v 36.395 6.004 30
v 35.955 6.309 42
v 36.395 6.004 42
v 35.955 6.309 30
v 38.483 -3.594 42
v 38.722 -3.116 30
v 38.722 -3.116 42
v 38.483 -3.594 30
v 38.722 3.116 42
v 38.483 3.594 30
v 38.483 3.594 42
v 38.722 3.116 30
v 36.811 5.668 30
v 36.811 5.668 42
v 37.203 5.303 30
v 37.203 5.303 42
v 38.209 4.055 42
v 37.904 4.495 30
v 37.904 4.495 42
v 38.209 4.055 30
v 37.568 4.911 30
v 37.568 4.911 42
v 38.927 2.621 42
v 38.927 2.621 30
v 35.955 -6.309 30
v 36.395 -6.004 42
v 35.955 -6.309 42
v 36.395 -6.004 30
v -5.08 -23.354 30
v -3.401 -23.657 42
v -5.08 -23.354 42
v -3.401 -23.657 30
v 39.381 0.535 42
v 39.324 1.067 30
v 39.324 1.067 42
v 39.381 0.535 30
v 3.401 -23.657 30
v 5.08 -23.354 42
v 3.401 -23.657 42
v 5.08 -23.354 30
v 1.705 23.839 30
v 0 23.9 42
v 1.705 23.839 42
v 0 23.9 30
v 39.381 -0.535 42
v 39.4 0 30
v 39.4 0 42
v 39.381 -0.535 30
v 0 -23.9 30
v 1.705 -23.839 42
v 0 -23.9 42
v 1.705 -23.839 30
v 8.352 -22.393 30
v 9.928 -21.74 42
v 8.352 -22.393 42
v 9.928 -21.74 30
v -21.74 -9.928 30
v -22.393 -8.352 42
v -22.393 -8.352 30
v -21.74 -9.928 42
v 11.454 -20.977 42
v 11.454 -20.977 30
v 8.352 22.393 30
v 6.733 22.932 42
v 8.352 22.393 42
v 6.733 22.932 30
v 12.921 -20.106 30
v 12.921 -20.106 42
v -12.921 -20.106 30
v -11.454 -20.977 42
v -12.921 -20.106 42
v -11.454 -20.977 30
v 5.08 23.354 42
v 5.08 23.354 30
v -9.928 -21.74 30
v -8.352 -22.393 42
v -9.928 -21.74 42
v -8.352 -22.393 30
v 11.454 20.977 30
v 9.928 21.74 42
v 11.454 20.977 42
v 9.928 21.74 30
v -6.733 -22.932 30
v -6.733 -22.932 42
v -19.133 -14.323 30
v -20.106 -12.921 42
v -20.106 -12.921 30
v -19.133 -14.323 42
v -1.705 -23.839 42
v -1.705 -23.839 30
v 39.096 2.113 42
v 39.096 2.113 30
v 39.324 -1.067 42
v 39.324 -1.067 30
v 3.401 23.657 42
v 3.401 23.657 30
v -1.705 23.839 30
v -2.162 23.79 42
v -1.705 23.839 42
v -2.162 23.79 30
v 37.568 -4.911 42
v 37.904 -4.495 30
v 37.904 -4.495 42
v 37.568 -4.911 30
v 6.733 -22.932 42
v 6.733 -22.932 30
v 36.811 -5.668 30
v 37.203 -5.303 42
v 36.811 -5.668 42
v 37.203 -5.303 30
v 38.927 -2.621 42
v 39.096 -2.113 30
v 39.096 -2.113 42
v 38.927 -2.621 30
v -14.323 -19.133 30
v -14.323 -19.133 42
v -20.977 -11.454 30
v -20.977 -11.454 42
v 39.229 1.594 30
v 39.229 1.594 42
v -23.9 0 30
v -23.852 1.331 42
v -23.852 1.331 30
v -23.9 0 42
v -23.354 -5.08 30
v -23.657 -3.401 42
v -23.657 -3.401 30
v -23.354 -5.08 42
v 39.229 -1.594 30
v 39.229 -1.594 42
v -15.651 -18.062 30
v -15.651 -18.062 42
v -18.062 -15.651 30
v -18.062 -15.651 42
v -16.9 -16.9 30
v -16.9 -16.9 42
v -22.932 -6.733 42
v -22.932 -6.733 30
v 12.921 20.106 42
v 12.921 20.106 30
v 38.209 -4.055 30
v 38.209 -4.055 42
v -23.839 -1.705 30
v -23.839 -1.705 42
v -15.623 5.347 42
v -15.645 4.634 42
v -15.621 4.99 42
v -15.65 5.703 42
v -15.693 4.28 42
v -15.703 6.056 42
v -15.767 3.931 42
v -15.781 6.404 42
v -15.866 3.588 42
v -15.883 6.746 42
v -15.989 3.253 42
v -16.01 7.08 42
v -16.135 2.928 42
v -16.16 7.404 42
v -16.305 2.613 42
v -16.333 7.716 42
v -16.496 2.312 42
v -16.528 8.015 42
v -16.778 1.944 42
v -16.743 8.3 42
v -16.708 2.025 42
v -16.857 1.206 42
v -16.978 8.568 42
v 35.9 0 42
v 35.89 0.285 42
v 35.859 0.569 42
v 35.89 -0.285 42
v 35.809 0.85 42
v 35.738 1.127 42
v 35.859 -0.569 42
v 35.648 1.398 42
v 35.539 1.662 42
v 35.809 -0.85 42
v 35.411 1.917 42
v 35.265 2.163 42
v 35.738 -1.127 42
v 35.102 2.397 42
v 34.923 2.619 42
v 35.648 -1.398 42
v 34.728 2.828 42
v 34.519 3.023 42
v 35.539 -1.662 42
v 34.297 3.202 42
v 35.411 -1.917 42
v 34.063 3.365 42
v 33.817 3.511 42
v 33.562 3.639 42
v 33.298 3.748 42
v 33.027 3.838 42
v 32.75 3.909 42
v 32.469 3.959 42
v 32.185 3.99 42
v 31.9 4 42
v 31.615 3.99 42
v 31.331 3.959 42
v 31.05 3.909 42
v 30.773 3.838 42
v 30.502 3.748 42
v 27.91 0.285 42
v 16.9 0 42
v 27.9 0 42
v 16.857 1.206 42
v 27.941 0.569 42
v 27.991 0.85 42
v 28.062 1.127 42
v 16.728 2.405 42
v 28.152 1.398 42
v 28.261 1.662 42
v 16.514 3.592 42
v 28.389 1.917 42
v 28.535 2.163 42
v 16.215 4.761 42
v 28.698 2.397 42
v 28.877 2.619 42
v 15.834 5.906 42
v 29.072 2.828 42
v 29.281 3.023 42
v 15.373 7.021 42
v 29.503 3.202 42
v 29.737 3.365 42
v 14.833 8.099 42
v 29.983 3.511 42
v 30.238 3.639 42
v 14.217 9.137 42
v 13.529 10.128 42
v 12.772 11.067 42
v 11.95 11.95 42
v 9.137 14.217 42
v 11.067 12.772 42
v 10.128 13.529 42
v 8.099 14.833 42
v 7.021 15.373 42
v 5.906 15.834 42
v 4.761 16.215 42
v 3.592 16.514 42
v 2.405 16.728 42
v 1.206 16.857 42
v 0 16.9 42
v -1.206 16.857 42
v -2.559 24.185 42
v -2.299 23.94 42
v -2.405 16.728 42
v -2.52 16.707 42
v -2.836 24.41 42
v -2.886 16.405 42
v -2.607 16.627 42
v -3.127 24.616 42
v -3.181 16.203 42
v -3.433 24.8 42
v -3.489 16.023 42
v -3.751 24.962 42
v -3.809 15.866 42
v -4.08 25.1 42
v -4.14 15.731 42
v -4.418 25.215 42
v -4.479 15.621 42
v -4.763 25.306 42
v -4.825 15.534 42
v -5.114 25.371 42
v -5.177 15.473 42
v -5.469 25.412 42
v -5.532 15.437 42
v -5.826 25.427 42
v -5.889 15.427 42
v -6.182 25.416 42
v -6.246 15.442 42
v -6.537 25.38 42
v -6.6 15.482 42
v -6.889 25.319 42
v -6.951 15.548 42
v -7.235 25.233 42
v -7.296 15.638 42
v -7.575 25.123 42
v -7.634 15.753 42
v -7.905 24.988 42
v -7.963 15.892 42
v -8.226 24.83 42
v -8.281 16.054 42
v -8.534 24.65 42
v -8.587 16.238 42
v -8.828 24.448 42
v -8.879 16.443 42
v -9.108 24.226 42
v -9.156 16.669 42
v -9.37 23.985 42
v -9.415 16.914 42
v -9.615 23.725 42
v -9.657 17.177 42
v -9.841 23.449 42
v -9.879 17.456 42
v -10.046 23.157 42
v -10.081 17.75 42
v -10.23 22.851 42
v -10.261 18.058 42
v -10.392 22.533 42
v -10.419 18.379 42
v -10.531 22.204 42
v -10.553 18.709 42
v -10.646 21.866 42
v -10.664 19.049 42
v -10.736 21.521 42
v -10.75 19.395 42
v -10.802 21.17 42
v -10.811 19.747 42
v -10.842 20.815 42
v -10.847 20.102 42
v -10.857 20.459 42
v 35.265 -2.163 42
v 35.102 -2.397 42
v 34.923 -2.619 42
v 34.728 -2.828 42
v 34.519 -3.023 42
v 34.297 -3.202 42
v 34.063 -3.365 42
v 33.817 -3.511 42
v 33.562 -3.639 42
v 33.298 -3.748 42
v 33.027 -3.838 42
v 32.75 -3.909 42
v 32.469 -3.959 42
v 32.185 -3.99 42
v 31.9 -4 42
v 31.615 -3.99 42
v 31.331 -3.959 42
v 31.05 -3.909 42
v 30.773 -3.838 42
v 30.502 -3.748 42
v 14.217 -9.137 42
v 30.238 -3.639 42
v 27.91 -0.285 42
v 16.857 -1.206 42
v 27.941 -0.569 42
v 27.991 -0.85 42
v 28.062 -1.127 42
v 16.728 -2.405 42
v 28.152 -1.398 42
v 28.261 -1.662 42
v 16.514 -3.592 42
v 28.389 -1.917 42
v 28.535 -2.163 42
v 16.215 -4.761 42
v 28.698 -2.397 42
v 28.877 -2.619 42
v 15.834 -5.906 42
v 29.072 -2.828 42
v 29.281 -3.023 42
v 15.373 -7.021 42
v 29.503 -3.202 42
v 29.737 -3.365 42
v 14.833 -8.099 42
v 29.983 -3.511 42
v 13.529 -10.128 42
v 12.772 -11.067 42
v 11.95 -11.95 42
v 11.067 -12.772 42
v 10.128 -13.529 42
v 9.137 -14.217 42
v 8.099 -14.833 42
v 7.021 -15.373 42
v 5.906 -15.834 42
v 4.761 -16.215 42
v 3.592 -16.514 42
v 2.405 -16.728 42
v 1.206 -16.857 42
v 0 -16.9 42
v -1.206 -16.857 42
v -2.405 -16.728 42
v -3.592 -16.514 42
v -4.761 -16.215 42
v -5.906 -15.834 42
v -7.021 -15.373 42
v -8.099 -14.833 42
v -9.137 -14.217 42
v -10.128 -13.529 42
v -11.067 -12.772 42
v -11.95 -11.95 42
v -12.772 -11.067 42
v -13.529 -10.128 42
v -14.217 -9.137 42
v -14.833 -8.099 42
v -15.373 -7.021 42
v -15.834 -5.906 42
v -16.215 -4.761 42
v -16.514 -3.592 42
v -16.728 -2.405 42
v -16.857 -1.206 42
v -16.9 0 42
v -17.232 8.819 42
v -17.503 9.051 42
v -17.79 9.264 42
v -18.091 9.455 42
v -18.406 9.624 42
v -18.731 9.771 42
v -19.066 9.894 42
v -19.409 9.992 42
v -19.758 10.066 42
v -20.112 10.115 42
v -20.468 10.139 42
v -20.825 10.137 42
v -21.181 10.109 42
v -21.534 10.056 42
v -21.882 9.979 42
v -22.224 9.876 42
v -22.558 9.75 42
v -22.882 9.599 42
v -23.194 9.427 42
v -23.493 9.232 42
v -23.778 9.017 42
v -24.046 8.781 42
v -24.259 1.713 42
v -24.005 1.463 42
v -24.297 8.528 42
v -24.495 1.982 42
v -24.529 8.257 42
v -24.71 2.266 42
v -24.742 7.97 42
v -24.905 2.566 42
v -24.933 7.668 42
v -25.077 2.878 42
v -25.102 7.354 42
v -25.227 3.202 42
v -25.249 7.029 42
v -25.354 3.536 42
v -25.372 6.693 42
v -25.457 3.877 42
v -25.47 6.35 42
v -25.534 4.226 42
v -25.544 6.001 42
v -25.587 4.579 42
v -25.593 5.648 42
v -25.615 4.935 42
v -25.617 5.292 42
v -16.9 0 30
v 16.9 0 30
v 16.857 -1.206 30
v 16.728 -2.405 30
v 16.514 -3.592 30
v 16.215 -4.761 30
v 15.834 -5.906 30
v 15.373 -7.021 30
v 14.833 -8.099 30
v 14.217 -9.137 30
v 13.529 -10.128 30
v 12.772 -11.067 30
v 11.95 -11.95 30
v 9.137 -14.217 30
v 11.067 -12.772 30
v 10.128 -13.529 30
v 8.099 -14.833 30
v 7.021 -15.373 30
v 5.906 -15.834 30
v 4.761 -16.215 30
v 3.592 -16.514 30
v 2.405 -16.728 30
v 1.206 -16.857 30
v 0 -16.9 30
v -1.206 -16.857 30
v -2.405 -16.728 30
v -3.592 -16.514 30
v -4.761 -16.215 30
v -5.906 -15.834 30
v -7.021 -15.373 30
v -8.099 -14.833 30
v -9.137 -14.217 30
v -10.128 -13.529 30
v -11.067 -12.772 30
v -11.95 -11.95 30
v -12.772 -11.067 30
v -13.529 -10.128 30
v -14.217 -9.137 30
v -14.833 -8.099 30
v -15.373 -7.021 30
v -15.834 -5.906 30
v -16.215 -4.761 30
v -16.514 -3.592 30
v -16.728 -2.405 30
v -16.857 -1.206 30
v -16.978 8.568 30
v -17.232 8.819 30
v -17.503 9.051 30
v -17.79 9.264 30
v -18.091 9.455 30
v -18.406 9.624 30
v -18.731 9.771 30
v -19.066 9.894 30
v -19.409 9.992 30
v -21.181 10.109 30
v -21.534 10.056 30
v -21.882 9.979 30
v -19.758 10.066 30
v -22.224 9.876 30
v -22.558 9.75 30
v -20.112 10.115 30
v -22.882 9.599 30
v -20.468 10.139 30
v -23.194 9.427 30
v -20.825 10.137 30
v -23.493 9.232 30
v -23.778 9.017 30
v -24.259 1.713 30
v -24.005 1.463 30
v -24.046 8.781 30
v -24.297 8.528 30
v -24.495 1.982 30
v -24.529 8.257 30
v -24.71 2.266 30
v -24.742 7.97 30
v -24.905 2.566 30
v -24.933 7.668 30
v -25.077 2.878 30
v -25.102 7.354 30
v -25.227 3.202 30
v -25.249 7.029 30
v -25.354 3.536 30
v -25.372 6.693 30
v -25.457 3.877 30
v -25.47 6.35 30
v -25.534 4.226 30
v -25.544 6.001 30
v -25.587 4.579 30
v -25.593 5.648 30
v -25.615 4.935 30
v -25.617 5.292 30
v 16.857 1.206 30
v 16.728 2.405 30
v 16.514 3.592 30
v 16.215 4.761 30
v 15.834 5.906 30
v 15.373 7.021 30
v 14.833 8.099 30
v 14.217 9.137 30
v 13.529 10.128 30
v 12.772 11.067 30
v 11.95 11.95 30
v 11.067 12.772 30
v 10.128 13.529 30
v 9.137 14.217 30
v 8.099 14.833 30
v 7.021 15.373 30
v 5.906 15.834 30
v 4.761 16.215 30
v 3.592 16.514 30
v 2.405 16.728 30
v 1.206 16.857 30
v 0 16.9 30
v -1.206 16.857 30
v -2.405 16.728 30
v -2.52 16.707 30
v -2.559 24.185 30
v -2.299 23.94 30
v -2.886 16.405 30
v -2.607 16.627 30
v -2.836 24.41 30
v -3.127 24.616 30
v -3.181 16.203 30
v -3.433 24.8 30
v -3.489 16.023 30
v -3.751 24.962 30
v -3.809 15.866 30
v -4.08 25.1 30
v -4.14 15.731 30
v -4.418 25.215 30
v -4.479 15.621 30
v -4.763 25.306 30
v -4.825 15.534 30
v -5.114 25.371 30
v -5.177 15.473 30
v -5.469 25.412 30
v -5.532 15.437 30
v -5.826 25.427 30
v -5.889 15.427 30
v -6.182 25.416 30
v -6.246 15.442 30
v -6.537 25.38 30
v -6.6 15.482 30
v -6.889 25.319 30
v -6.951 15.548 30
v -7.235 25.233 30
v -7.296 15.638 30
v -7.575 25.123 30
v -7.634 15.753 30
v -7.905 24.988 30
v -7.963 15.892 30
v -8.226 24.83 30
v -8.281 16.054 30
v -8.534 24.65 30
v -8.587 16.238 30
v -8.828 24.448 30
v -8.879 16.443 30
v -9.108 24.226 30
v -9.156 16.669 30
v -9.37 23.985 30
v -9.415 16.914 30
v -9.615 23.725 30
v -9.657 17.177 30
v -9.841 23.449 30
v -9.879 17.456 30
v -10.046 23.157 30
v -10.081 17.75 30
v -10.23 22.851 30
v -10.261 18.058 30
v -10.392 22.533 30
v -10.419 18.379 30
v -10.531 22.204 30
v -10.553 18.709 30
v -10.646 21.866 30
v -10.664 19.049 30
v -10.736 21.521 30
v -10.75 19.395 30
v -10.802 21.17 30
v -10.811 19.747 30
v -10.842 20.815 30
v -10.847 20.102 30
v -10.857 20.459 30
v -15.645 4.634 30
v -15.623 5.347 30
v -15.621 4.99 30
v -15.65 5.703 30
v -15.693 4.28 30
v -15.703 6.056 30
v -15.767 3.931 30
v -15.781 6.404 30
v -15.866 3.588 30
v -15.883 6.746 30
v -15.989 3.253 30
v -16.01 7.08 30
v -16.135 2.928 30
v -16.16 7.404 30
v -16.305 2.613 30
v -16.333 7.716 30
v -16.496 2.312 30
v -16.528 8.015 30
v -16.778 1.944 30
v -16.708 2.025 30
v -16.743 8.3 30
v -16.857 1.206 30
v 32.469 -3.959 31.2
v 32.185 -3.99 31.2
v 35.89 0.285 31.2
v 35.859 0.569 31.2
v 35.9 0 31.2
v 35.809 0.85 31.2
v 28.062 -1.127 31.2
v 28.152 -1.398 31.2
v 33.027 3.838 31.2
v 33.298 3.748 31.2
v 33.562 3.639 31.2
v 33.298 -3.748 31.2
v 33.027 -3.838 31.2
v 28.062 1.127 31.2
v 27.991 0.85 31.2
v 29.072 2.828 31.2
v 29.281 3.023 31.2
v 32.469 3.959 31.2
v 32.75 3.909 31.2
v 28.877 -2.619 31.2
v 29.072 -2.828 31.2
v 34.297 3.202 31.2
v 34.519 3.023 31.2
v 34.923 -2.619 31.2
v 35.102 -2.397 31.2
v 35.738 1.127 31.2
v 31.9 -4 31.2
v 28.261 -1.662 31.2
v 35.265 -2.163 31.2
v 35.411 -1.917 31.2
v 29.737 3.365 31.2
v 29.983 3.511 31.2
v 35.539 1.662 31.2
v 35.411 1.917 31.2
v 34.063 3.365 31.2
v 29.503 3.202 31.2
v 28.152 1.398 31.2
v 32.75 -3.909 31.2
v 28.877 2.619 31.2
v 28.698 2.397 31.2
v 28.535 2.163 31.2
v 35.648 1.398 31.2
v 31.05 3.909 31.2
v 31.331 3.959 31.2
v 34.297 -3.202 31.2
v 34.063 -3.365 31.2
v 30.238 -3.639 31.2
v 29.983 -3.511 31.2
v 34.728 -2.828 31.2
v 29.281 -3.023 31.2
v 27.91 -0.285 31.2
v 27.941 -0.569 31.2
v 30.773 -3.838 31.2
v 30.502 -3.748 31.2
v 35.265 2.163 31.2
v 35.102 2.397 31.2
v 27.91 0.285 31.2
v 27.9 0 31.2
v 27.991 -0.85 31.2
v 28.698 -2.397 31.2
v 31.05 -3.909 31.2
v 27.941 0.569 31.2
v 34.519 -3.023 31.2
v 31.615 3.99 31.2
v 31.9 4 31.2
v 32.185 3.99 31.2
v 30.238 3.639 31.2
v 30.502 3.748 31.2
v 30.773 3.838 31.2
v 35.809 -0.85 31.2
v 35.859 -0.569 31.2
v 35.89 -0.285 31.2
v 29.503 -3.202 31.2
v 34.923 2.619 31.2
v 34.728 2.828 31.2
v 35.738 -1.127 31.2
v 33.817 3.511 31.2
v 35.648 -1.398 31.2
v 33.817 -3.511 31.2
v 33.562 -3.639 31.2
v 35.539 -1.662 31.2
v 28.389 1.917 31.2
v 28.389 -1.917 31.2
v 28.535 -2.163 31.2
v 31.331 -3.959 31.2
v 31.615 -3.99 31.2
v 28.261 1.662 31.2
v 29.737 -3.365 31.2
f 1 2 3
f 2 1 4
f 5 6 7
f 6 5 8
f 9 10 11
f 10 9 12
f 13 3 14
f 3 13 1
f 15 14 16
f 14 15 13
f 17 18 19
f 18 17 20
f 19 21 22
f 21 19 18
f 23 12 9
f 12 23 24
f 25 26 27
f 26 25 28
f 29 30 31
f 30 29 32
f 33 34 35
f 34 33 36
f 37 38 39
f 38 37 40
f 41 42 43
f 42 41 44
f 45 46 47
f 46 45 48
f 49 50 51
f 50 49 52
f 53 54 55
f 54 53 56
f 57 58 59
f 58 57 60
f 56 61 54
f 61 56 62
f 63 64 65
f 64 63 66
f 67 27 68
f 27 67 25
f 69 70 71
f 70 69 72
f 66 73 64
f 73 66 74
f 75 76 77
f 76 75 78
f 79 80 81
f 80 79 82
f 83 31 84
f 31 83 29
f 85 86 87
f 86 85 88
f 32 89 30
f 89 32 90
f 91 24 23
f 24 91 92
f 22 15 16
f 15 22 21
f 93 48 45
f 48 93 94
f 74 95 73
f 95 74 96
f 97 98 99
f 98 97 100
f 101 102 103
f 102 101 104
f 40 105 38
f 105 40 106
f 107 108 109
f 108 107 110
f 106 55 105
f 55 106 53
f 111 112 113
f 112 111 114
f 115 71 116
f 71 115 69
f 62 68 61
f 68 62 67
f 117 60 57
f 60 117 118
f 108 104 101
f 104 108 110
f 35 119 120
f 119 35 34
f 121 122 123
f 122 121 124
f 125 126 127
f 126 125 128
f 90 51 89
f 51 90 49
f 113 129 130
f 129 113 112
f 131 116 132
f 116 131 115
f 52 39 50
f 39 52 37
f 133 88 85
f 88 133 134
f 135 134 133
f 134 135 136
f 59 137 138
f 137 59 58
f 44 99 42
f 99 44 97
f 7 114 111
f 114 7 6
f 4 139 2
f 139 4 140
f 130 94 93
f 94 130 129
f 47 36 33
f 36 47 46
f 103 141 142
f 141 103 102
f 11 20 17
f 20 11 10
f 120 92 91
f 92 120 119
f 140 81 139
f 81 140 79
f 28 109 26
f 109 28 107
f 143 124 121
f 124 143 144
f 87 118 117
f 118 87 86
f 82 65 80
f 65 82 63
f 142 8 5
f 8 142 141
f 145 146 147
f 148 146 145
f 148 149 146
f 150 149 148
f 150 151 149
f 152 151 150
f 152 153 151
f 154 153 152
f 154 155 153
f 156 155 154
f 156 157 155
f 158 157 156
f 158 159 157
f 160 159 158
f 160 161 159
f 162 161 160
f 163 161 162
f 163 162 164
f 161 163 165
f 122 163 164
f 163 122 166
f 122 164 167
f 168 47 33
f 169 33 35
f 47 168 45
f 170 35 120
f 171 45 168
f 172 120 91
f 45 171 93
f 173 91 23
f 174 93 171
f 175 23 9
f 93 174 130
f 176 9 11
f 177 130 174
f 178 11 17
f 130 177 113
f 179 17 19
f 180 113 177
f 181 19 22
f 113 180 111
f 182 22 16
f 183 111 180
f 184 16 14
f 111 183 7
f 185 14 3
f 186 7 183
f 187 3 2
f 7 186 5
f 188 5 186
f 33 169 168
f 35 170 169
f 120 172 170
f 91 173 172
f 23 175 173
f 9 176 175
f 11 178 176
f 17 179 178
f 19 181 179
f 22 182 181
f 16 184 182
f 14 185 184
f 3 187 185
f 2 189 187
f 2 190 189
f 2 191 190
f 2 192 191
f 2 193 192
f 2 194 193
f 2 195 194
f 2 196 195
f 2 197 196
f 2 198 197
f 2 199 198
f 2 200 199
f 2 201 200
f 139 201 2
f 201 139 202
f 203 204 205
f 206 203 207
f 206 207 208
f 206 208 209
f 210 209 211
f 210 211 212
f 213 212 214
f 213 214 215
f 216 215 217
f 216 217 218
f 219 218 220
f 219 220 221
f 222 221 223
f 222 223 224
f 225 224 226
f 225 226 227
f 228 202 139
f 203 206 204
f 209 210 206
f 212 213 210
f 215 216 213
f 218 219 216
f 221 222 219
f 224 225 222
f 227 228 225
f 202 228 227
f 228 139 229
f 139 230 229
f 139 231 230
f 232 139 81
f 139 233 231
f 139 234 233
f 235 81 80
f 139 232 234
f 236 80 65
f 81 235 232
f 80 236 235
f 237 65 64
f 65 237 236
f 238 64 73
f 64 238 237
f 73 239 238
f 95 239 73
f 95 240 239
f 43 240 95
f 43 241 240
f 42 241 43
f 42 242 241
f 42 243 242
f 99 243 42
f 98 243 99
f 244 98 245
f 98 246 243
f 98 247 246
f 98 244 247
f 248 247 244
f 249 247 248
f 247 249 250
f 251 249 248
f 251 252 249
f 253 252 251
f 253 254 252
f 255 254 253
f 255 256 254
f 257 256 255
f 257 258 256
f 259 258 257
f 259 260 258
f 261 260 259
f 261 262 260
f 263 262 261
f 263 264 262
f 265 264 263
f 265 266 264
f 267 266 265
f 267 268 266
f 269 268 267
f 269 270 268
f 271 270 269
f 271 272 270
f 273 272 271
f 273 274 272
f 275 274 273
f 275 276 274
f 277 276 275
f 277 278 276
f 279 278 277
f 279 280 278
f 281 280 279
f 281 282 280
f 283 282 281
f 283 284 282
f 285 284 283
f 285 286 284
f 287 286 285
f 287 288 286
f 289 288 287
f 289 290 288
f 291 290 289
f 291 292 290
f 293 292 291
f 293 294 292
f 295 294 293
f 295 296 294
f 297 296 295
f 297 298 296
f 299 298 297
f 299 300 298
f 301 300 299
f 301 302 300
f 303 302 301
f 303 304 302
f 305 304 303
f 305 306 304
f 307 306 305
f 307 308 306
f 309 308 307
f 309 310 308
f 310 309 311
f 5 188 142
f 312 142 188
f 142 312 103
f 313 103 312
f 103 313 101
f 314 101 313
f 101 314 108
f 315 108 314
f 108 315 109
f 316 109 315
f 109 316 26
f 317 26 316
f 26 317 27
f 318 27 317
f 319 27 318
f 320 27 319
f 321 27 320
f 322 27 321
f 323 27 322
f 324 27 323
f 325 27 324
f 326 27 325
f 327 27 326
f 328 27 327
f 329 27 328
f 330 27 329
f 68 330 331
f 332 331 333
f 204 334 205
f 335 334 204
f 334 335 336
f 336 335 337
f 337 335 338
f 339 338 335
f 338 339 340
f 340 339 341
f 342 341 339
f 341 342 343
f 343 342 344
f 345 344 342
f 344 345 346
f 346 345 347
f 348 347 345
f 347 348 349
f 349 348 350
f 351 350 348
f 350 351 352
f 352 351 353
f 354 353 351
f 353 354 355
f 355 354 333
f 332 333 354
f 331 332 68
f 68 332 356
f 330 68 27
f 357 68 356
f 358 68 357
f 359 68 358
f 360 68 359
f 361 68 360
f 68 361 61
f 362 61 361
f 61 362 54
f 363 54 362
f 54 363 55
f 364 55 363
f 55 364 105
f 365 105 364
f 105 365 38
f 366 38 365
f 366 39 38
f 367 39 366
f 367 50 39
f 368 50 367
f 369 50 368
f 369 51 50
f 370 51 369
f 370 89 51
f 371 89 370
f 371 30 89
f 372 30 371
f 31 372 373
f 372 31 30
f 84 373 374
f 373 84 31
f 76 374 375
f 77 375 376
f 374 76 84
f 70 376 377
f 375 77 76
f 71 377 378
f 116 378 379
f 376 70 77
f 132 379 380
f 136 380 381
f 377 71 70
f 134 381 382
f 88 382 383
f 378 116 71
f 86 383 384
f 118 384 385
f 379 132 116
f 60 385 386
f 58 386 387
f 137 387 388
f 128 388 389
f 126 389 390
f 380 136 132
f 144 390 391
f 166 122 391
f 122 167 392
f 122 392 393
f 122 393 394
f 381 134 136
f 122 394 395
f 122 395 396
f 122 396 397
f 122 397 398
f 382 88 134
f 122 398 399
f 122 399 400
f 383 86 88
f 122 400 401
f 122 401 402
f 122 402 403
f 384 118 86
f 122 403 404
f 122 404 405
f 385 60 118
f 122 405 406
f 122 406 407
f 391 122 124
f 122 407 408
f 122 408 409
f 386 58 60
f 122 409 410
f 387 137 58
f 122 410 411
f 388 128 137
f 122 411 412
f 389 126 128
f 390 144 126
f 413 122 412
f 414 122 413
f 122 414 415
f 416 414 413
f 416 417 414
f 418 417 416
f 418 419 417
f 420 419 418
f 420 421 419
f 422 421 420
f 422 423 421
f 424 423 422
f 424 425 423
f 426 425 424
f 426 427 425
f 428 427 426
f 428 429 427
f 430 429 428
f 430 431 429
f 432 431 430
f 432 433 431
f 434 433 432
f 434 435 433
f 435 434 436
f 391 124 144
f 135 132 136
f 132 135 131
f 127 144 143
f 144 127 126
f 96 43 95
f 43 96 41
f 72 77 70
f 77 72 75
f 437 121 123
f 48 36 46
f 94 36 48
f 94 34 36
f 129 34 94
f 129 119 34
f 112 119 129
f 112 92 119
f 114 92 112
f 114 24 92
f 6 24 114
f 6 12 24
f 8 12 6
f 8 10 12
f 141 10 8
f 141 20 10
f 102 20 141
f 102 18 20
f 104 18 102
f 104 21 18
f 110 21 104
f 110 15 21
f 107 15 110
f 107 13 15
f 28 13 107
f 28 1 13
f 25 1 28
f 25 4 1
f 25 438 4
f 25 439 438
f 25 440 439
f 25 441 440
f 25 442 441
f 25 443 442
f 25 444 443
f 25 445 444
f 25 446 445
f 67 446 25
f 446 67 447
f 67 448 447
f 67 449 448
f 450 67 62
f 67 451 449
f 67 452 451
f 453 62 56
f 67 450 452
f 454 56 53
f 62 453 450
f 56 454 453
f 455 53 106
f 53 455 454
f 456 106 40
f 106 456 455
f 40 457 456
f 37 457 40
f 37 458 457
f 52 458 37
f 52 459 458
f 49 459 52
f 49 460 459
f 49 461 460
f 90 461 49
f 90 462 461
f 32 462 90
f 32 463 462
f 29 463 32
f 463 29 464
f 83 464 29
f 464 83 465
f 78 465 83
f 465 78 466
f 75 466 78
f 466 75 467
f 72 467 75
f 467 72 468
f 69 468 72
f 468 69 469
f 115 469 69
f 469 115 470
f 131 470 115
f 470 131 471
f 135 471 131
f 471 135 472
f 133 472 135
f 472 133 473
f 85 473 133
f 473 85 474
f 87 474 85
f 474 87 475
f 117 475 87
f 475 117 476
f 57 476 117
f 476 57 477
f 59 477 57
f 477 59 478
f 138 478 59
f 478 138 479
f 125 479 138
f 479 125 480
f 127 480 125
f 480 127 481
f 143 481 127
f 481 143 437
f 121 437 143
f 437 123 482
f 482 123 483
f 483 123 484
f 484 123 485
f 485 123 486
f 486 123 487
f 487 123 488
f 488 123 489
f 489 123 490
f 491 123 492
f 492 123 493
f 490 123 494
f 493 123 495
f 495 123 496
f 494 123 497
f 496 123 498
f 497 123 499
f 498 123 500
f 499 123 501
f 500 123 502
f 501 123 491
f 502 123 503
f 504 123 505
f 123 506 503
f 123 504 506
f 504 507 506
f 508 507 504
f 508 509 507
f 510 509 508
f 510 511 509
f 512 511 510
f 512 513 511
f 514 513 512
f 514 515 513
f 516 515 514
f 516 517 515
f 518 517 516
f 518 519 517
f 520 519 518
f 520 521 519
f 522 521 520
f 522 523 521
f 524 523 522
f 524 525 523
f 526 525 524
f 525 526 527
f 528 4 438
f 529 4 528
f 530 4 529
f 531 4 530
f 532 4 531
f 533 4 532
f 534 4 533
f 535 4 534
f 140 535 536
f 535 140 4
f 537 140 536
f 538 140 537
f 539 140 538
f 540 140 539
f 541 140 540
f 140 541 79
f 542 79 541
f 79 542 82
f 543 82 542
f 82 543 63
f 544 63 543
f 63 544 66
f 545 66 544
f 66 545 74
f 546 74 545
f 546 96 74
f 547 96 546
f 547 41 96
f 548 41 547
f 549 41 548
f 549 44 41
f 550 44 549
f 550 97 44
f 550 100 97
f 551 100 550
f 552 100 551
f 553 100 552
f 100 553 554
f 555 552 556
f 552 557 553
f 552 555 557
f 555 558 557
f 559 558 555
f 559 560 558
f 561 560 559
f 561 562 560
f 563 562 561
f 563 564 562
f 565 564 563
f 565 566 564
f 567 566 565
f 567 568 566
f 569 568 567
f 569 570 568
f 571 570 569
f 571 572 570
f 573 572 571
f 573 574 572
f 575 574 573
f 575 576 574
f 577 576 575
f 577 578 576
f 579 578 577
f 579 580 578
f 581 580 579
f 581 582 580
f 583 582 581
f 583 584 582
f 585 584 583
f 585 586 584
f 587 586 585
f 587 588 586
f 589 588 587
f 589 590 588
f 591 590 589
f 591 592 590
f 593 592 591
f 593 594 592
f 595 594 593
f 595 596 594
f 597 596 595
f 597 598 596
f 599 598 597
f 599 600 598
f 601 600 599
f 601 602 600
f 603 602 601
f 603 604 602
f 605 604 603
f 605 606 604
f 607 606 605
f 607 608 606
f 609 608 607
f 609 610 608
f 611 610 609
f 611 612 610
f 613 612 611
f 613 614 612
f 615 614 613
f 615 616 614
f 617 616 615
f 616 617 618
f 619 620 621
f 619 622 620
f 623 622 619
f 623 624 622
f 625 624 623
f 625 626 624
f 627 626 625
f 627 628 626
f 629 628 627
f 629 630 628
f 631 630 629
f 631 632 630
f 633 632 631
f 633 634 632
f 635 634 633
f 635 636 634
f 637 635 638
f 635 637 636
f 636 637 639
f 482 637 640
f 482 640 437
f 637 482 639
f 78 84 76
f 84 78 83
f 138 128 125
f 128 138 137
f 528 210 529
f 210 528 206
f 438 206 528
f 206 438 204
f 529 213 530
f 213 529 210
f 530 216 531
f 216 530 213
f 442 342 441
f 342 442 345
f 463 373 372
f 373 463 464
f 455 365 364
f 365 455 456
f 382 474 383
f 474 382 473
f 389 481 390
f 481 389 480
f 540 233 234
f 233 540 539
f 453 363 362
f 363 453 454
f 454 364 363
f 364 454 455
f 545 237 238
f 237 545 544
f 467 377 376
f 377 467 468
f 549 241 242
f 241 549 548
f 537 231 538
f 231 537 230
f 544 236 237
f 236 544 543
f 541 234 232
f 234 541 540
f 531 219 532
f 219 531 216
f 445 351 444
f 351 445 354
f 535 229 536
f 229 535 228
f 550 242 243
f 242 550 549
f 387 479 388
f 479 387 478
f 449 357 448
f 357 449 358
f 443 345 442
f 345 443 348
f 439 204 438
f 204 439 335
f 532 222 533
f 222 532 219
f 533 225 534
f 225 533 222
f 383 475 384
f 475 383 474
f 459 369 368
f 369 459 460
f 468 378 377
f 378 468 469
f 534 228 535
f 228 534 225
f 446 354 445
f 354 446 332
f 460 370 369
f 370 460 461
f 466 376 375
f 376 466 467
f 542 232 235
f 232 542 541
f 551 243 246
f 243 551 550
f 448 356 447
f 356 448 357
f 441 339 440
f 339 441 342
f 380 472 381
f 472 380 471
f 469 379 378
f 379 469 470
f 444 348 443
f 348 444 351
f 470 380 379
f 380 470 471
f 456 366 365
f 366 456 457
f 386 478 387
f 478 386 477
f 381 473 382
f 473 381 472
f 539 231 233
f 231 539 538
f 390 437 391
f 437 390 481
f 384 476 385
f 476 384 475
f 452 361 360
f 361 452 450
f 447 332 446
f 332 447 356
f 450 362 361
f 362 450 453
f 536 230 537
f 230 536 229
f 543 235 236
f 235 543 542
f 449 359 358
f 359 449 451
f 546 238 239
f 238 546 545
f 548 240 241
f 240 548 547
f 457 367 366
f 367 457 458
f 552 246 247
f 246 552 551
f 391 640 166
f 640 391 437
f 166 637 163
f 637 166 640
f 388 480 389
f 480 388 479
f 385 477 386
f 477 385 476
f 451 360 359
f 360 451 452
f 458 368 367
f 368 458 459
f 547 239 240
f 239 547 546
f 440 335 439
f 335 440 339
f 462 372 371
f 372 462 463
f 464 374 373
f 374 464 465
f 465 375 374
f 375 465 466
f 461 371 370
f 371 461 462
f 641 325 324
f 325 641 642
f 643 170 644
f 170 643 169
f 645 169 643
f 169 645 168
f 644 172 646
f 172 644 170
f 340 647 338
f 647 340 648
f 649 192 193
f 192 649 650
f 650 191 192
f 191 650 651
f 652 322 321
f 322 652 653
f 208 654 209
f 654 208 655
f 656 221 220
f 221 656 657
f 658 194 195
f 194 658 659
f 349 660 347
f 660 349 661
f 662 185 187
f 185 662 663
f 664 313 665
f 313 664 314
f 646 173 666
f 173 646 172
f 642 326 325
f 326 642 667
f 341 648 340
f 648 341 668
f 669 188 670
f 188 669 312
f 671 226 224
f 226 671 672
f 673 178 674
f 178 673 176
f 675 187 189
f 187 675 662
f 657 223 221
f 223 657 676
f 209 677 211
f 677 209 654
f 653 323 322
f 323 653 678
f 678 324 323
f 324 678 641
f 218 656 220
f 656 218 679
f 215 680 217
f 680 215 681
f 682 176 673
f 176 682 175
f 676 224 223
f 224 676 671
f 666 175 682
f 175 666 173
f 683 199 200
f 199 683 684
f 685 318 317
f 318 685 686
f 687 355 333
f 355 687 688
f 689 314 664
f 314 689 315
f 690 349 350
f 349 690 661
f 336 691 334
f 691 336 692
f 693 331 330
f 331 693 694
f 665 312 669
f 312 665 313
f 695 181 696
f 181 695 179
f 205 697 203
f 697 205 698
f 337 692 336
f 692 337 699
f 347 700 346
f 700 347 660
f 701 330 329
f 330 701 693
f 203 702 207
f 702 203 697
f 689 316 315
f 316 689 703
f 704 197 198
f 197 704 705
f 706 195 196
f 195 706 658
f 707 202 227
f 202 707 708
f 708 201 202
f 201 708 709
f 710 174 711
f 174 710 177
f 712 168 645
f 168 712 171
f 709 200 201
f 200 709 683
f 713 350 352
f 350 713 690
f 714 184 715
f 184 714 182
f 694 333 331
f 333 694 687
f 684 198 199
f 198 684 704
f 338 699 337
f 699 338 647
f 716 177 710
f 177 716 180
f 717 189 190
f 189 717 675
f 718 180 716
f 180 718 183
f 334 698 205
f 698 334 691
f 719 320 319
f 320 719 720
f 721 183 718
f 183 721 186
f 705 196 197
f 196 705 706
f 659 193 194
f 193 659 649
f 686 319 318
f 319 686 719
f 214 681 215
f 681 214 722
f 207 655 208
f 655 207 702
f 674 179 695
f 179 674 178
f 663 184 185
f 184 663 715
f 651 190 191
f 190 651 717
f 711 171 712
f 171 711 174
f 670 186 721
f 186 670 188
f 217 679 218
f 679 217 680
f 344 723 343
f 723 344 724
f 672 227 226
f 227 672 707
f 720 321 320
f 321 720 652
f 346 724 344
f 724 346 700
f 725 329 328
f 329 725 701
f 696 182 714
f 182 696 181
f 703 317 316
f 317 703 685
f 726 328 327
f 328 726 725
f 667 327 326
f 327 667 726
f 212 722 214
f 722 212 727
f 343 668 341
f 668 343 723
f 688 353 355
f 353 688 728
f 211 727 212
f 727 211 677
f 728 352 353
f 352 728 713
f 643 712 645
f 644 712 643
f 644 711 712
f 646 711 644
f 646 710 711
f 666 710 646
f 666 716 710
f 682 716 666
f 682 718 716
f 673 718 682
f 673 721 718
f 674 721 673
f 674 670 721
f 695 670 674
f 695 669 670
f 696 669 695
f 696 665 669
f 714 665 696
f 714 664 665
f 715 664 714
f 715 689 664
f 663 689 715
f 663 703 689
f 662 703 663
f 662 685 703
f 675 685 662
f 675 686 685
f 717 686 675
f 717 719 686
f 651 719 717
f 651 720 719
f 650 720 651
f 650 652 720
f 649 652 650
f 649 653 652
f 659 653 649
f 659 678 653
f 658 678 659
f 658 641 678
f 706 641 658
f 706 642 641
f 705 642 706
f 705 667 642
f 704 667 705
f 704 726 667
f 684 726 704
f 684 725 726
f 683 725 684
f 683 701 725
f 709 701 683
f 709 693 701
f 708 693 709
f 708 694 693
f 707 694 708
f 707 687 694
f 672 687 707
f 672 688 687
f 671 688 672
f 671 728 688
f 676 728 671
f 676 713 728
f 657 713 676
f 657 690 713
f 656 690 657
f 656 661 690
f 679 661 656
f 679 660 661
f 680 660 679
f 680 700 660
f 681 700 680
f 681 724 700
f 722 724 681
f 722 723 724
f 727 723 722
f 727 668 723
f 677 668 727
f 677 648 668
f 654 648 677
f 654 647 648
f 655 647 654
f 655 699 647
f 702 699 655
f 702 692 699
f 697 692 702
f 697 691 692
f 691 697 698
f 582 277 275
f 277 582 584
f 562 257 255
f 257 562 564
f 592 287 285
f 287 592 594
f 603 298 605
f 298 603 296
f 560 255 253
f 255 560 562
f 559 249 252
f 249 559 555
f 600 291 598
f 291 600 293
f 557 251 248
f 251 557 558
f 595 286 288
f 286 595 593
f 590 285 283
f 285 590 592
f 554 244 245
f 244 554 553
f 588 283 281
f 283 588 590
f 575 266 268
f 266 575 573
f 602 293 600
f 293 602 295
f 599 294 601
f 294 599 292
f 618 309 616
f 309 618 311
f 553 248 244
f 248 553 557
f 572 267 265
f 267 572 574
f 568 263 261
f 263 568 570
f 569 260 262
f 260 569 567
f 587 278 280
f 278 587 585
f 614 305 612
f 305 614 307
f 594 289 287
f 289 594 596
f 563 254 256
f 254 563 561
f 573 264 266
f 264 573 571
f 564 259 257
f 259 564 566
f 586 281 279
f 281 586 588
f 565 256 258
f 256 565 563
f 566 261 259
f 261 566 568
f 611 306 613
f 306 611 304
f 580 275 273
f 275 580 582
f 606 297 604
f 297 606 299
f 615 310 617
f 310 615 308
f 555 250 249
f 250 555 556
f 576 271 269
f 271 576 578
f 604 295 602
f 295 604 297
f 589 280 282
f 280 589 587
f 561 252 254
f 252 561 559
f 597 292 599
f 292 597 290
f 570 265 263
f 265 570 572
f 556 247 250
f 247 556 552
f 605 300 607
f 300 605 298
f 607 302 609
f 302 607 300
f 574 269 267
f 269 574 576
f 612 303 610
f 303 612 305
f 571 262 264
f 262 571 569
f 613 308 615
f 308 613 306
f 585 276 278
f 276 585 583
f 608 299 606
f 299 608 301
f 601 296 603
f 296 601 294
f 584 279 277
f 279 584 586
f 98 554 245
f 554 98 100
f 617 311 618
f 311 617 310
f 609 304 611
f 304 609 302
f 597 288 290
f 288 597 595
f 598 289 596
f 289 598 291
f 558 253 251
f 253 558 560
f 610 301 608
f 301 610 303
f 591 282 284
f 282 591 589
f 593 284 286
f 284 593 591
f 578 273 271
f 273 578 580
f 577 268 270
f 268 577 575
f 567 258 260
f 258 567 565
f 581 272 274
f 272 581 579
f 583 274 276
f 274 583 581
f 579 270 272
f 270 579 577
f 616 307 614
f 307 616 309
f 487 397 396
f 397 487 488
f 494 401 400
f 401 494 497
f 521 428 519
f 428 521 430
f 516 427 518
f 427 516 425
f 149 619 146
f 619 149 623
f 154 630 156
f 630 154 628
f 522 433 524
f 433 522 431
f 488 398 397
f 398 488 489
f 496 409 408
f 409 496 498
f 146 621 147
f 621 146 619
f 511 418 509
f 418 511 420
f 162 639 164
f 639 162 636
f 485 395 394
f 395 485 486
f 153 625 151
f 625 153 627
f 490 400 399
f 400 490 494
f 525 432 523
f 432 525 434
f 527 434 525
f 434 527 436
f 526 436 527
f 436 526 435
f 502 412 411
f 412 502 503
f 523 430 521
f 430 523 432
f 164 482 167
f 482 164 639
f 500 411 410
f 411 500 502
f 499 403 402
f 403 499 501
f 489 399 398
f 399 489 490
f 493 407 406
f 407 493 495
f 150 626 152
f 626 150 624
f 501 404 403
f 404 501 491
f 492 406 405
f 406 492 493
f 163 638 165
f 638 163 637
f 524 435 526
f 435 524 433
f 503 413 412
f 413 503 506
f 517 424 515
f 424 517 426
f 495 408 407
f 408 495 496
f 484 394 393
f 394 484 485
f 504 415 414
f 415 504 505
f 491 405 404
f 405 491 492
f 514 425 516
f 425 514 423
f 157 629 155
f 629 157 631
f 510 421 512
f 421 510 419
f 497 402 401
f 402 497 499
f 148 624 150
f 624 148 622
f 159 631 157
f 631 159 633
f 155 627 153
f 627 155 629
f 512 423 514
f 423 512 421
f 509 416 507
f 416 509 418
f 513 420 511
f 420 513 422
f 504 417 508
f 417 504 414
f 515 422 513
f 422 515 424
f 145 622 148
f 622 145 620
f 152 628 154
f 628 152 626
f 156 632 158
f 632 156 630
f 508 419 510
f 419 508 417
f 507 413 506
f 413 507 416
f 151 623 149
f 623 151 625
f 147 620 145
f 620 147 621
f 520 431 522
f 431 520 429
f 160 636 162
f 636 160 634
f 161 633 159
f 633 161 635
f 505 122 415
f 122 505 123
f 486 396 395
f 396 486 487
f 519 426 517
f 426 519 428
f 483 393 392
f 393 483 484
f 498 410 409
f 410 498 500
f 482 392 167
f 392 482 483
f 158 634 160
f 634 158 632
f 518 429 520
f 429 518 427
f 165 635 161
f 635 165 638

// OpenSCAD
// windy1.scad
// Bracket to attach windicator to garden hosepipe riser.

//use <../Parts/tslot.scad>
//use <frame.scad>

//======================================
// Customizer Values:
// These must be at the top of the main file, cannot contain any
// computations, and should have a comment above to provide text

// Post Diameter (mm)
PostD=33.8;        

// Post to Pole offset
P2P=15;

// Post clamp height
PostH=12;

// Thickness of the clamp
Thick=7;

// Pole Diameter 1
Pole1=7.7;

// Pole Diameter 2
Pole2=9.0;

// Pole hole tolerance
PoleT=0.15;

// --------------------
module windy1(){
F2=88;  
  
  difference(){
    // boss
    hull(){
      cylinder(r=PostD/2+Thick,h=PostH,$fn=F2);
      
      translate([P2P+PostD/2,0,0])
      cylinder(r=Pole2/2+3,h=PostH,$fn=F2);
    }

    // cut for the post
    translate([0,0,-1])
    cylinder(r=PostD/2,h=PostH+2,$fn=F2);

    // cut for the pole 
    translate([P2P+PostD/2,0,-1])
    cylinder(r=Pole2/2+PoleT,h=PostH+2,$fn=F2);

    // cut to form clamp
    rotate([0,0,45])
    translate([0,PostD/2-1,PostH/2-0.5])
    cube([20,20,PostH+2],center=true);
    

  }

      color("red")
      rotate([0,0,16])
      translate([0,PostD/2+4.35,0])
      cylinder(r=5,h=PostH,$fn=F2);

      color("green")
      rotate([0,0,76])
      translate([0,PostD/2+4.35,0])
      cylinder(r=5,h=PostH,$fn=F2);
}

// --------------------
module windy2(){
F2=88;  
  
  difference(){
    // boss
    hull(){
      cylinder(r=PostD/2+Thick,h=PostH,$fn=F2);
      
      translate([P2P+PostD/2,0,0])
      cylinder(r=Pole2/2+3,h=PostH,$fn=F2);

    }

    // cut for the post
    translate([0,0,-1])
    cylinder(r=PostD/2,h=PostH+2,$fn=F2);

    // cut for the pole 
    translate([P2P+PostD/2,0,1.2])
    cylinder(r=Pole1/2+PoleT,h=PostH+2,$fn=F2);

    // cut to form clamp
    rotate([0,0,45])
    translate([0,PostD/2-1,PostH/2-0.5])
    cube([20,20,PostH+2],center=true);
    

  }
      color("red")
      rotate([0,0,16])
      translate([0,PostD/2+4.35,0])
      cylinder(r=5,h=PostH,$fn=F2);

      color("green")
      rotate([0,0,76])
      translate([0,PostD/2+4.35,0])
      cylinder(r=5,h=PostH,$fn=F2);
}


//===========================

color("cyan")
translate([0,0,30])
//windy1();

windy2();

//============================
